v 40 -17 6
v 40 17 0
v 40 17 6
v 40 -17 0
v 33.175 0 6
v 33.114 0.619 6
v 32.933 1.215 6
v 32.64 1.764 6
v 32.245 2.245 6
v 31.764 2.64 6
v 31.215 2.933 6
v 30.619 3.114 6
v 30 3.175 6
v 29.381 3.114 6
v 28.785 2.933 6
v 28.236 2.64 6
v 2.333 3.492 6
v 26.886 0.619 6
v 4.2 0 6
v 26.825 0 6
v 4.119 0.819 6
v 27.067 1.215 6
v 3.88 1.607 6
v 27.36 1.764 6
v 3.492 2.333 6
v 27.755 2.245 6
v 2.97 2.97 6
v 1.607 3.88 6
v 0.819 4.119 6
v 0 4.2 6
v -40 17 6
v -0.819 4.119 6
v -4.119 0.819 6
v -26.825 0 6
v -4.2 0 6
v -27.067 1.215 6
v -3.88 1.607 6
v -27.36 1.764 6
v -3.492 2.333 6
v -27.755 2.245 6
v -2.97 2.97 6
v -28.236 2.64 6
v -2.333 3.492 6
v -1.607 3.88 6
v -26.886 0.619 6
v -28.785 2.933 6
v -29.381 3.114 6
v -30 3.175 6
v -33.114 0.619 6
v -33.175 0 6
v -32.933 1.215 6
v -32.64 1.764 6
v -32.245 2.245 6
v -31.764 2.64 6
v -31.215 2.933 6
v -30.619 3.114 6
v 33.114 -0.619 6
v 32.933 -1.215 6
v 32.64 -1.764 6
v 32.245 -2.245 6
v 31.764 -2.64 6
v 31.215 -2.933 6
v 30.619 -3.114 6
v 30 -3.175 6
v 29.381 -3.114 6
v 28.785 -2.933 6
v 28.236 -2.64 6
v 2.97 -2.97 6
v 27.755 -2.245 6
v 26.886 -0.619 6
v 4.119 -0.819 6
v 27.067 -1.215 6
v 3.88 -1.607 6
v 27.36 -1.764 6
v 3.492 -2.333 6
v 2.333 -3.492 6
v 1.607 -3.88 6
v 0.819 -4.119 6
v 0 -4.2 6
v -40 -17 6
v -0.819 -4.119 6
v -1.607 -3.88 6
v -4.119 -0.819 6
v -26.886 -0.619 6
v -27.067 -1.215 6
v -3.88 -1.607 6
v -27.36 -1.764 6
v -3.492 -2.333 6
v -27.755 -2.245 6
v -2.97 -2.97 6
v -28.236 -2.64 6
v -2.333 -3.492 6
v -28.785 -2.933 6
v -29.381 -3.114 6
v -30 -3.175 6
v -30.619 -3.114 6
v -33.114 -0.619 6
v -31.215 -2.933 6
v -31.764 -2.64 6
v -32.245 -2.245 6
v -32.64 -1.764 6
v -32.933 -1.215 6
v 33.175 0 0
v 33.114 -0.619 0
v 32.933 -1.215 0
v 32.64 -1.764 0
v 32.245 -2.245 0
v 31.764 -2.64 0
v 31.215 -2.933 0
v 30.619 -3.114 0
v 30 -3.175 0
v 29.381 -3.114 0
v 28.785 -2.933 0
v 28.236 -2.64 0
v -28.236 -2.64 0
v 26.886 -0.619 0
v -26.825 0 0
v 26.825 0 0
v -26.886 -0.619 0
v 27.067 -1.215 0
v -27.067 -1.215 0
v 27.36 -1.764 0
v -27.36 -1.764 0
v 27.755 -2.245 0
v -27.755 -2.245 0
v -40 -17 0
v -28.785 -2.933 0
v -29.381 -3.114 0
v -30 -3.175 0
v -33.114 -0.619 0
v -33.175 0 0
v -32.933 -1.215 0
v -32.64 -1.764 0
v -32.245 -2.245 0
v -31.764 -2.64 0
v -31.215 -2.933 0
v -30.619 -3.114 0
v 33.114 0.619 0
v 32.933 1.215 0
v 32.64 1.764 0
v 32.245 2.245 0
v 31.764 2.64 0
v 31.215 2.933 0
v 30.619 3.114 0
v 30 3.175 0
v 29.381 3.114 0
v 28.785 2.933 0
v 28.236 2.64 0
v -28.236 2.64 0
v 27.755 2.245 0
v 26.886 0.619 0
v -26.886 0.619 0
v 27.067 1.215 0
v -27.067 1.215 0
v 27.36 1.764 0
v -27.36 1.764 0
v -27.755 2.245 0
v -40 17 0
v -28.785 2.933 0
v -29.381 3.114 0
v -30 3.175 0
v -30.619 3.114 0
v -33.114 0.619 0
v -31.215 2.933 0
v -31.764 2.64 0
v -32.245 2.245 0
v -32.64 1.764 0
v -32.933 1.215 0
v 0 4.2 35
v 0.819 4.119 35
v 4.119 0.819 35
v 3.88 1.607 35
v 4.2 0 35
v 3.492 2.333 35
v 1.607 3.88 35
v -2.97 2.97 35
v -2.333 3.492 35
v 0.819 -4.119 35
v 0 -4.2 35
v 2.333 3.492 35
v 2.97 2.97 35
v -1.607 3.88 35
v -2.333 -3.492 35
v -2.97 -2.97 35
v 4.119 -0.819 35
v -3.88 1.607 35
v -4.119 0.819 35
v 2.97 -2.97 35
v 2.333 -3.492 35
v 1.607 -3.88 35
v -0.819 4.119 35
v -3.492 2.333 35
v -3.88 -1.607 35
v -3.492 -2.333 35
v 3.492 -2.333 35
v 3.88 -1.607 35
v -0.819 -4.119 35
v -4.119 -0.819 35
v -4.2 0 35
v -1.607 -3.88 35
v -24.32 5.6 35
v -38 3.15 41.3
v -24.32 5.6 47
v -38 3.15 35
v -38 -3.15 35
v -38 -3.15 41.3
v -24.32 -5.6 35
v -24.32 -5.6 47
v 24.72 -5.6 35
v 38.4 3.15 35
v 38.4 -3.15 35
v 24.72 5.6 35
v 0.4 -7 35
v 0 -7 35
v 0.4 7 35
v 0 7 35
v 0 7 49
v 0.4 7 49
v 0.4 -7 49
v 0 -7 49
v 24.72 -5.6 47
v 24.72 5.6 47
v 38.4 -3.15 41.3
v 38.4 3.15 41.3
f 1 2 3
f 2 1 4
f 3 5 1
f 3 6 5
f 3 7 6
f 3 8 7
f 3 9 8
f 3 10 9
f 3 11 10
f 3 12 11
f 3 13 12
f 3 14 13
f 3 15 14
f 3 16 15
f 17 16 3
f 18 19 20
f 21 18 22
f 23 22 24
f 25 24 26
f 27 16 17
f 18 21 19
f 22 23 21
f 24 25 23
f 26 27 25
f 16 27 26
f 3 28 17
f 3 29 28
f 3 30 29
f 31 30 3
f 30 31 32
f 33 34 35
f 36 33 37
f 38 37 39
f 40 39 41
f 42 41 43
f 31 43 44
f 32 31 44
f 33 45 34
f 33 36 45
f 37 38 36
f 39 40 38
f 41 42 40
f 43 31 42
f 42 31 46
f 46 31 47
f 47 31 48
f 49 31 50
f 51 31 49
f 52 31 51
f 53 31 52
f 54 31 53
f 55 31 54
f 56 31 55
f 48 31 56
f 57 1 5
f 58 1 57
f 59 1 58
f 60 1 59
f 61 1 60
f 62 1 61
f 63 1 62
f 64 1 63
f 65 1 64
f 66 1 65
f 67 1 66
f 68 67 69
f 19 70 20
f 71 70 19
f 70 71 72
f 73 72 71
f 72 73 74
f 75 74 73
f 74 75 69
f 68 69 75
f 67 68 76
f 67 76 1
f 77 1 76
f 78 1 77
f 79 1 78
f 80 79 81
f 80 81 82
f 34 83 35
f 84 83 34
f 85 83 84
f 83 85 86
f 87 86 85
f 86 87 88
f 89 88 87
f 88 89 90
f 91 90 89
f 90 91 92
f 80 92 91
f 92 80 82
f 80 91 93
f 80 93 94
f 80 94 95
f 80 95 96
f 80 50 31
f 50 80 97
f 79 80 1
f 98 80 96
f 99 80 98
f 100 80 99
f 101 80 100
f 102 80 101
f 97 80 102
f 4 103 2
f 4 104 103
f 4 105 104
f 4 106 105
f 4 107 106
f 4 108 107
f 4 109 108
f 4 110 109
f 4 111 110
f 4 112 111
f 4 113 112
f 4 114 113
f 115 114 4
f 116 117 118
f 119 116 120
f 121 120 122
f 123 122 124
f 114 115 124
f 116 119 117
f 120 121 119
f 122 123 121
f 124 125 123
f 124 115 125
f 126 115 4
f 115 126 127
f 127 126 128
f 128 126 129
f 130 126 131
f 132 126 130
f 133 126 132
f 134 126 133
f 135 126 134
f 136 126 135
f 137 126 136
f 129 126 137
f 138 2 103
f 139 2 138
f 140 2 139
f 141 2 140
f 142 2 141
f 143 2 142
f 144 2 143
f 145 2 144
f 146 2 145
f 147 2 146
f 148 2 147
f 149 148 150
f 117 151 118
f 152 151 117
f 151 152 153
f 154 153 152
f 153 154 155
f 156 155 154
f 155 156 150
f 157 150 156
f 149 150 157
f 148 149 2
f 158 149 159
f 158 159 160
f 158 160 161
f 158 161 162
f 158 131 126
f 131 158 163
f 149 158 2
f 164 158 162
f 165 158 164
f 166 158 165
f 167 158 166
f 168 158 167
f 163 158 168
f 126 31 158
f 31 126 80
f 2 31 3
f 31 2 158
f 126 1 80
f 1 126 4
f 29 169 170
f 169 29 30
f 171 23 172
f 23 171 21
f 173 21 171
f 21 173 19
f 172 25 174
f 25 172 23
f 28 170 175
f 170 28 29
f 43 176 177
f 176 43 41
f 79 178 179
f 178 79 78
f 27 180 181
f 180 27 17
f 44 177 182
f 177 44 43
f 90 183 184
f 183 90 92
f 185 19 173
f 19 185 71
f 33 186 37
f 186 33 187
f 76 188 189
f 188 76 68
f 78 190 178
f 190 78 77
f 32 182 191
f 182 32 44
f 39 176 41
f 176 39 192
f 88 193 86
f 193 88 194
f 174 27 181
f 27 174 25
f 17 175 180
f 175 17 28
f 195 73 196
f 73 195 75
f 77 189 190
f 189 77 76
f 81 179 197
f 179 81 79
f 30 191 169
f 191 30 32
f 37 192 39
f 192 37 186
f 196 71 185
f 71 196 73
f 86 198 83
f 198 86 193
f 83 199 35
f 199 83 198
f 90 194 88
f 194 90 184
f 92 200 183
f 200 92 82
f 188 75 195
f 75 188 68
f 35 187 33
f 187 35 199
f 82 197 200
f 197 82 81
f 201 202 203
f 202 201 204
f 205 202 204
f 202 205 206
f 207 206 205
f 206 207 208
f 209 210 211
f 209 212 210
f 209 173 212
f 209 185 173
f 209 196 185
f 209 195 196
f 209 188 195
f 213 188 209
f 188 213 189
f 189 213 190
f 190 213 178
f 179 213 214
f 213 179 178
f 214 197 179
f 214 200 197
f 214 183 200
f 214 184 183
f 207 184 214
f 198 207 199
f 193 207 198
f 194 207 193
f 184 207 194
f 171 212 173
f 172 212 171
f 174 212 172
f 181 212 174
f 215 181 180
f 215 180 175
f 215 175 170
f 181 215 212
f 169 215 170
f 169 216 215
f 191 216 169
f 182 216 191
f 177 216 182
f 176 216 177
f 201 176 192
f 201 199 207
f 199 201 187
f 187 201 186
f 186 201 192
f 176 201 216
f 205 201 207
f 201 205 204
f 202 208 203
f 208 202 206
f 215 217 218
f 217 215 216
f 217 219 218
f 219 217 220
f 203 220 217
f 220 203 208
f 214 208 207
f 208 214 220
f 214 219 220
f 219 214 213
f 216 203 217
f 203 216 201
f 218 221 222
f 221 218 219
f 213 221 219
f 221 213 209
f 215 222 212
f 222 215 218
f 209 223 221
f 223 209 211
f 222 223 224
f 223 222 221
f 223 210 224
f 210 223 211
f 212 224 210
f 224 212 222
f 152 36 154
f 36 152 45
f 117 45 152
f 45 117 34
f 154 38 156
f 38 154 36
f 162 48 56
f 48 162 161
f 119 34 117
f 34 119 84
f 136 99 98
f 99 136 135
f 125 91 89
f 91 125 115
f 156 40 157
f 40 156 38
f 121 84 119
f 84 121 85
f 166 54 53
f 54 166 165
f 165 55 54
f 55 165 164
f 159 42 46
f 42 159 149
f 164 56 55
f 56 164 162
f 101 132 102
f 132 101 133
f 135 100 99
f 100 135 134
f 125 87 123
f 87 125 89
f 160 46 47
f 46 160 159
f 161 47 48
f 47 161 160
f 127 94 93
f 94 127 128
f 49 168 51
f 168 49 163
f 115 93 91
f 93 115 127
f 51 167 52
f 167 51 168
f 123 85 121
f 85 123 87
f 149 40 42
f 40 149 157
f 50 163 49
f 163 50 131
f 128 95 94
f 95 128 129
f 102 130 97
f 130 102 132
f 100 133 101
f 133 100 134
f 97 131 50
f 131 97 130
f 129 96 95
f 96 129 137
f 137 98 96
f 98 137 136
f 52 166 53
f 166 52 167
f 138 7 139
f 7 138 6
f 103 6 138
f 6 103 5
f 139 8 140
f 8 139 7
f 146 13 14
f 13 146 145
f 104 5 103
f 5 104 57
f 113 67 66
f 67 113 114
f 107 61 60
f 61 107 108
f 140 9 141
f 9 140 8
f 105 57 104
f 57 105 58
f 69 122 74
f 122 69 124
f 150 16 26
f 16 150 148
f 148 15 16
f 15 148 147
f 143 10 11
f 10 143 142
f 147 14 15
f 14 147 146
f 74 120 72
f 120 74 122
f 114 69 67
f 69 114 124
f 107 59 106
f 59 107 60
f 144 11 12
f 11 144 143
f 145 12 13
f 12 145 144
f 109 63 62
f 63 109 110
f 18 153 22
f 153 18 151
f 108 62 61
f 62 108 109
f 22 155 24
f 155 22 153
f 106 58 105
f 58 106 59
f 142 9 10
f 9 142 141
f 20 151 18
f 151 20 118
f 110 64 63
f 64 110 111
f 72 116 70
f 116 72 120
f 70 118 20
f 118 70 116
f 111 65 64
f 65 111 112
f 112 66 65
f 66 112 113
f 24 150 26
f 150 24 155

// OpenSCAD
$fn = 32;

// ----------------------------------------------------------------------
// Boat cleat: 80 mm base, horn 42 mm up
// ----------------------------------------------------------------------

// --- parameters (mm) ---
base_l = 80;              // base length
base_w = 34;              // base width
base_t = 6;               // base thickness
horn_len = 76;            // horn length
horn_d = 14;              // horn diameter at the middle
horn_z = 42;              // horn axis height
end_drop = 8;             // how far the horn tips drop
post_d = 8.4;             // centre post diameter
holes_d = 6.35;           // fixing holes
hole_x = 30;              // fixing hole spacing

difference() {
  union() {
    translate([-40, -17, 0]) cube([base_l, base_w, base_t]);
    /* centre post, sunk 1 mm into the base */
    translate([0, 0, 5]) cylinder(h = 37, d = post_d);
    /* horn: a hull chain of boxes, full in the middle and lighter at the tips */
    hull() {
      translate([-38, -3.15, 35]) cube([0.4, 6.3, 6.3], center = false);
      translate([-24.32, -5.6, 35]) cube([0.4, 11.2, 12], center = false);
    }
    hull() {
      translate([-24.32, -5.6, 35]) cube([0.4, 11.2, 12], center = false);
      translate([0, -7, 35]) cube([0.4, 14, 14], center = false);
    }
    hull() {
      translate([0, -7, 35]) cube([0.4, 14, 14], center = false);
      translate([24.32, -5.6, 35]) cube([0.4, 11.2, 12], center = false);
    }
    hull() {
      translate([24.32, -5.6, 35]) cube([0.4, 11.2, 12], center = false);
      translate([38, -3.15, 35]) cube([0.4, 6.3, 6.3], center = false);
    }
  }
  translate([-30, 0, -2.5]) cylinder(h = base_t + 5, d = holes_d);
  translate([30, 0, -2.5]) cylinder(h = base_t + 5, d = holes_d);
}
